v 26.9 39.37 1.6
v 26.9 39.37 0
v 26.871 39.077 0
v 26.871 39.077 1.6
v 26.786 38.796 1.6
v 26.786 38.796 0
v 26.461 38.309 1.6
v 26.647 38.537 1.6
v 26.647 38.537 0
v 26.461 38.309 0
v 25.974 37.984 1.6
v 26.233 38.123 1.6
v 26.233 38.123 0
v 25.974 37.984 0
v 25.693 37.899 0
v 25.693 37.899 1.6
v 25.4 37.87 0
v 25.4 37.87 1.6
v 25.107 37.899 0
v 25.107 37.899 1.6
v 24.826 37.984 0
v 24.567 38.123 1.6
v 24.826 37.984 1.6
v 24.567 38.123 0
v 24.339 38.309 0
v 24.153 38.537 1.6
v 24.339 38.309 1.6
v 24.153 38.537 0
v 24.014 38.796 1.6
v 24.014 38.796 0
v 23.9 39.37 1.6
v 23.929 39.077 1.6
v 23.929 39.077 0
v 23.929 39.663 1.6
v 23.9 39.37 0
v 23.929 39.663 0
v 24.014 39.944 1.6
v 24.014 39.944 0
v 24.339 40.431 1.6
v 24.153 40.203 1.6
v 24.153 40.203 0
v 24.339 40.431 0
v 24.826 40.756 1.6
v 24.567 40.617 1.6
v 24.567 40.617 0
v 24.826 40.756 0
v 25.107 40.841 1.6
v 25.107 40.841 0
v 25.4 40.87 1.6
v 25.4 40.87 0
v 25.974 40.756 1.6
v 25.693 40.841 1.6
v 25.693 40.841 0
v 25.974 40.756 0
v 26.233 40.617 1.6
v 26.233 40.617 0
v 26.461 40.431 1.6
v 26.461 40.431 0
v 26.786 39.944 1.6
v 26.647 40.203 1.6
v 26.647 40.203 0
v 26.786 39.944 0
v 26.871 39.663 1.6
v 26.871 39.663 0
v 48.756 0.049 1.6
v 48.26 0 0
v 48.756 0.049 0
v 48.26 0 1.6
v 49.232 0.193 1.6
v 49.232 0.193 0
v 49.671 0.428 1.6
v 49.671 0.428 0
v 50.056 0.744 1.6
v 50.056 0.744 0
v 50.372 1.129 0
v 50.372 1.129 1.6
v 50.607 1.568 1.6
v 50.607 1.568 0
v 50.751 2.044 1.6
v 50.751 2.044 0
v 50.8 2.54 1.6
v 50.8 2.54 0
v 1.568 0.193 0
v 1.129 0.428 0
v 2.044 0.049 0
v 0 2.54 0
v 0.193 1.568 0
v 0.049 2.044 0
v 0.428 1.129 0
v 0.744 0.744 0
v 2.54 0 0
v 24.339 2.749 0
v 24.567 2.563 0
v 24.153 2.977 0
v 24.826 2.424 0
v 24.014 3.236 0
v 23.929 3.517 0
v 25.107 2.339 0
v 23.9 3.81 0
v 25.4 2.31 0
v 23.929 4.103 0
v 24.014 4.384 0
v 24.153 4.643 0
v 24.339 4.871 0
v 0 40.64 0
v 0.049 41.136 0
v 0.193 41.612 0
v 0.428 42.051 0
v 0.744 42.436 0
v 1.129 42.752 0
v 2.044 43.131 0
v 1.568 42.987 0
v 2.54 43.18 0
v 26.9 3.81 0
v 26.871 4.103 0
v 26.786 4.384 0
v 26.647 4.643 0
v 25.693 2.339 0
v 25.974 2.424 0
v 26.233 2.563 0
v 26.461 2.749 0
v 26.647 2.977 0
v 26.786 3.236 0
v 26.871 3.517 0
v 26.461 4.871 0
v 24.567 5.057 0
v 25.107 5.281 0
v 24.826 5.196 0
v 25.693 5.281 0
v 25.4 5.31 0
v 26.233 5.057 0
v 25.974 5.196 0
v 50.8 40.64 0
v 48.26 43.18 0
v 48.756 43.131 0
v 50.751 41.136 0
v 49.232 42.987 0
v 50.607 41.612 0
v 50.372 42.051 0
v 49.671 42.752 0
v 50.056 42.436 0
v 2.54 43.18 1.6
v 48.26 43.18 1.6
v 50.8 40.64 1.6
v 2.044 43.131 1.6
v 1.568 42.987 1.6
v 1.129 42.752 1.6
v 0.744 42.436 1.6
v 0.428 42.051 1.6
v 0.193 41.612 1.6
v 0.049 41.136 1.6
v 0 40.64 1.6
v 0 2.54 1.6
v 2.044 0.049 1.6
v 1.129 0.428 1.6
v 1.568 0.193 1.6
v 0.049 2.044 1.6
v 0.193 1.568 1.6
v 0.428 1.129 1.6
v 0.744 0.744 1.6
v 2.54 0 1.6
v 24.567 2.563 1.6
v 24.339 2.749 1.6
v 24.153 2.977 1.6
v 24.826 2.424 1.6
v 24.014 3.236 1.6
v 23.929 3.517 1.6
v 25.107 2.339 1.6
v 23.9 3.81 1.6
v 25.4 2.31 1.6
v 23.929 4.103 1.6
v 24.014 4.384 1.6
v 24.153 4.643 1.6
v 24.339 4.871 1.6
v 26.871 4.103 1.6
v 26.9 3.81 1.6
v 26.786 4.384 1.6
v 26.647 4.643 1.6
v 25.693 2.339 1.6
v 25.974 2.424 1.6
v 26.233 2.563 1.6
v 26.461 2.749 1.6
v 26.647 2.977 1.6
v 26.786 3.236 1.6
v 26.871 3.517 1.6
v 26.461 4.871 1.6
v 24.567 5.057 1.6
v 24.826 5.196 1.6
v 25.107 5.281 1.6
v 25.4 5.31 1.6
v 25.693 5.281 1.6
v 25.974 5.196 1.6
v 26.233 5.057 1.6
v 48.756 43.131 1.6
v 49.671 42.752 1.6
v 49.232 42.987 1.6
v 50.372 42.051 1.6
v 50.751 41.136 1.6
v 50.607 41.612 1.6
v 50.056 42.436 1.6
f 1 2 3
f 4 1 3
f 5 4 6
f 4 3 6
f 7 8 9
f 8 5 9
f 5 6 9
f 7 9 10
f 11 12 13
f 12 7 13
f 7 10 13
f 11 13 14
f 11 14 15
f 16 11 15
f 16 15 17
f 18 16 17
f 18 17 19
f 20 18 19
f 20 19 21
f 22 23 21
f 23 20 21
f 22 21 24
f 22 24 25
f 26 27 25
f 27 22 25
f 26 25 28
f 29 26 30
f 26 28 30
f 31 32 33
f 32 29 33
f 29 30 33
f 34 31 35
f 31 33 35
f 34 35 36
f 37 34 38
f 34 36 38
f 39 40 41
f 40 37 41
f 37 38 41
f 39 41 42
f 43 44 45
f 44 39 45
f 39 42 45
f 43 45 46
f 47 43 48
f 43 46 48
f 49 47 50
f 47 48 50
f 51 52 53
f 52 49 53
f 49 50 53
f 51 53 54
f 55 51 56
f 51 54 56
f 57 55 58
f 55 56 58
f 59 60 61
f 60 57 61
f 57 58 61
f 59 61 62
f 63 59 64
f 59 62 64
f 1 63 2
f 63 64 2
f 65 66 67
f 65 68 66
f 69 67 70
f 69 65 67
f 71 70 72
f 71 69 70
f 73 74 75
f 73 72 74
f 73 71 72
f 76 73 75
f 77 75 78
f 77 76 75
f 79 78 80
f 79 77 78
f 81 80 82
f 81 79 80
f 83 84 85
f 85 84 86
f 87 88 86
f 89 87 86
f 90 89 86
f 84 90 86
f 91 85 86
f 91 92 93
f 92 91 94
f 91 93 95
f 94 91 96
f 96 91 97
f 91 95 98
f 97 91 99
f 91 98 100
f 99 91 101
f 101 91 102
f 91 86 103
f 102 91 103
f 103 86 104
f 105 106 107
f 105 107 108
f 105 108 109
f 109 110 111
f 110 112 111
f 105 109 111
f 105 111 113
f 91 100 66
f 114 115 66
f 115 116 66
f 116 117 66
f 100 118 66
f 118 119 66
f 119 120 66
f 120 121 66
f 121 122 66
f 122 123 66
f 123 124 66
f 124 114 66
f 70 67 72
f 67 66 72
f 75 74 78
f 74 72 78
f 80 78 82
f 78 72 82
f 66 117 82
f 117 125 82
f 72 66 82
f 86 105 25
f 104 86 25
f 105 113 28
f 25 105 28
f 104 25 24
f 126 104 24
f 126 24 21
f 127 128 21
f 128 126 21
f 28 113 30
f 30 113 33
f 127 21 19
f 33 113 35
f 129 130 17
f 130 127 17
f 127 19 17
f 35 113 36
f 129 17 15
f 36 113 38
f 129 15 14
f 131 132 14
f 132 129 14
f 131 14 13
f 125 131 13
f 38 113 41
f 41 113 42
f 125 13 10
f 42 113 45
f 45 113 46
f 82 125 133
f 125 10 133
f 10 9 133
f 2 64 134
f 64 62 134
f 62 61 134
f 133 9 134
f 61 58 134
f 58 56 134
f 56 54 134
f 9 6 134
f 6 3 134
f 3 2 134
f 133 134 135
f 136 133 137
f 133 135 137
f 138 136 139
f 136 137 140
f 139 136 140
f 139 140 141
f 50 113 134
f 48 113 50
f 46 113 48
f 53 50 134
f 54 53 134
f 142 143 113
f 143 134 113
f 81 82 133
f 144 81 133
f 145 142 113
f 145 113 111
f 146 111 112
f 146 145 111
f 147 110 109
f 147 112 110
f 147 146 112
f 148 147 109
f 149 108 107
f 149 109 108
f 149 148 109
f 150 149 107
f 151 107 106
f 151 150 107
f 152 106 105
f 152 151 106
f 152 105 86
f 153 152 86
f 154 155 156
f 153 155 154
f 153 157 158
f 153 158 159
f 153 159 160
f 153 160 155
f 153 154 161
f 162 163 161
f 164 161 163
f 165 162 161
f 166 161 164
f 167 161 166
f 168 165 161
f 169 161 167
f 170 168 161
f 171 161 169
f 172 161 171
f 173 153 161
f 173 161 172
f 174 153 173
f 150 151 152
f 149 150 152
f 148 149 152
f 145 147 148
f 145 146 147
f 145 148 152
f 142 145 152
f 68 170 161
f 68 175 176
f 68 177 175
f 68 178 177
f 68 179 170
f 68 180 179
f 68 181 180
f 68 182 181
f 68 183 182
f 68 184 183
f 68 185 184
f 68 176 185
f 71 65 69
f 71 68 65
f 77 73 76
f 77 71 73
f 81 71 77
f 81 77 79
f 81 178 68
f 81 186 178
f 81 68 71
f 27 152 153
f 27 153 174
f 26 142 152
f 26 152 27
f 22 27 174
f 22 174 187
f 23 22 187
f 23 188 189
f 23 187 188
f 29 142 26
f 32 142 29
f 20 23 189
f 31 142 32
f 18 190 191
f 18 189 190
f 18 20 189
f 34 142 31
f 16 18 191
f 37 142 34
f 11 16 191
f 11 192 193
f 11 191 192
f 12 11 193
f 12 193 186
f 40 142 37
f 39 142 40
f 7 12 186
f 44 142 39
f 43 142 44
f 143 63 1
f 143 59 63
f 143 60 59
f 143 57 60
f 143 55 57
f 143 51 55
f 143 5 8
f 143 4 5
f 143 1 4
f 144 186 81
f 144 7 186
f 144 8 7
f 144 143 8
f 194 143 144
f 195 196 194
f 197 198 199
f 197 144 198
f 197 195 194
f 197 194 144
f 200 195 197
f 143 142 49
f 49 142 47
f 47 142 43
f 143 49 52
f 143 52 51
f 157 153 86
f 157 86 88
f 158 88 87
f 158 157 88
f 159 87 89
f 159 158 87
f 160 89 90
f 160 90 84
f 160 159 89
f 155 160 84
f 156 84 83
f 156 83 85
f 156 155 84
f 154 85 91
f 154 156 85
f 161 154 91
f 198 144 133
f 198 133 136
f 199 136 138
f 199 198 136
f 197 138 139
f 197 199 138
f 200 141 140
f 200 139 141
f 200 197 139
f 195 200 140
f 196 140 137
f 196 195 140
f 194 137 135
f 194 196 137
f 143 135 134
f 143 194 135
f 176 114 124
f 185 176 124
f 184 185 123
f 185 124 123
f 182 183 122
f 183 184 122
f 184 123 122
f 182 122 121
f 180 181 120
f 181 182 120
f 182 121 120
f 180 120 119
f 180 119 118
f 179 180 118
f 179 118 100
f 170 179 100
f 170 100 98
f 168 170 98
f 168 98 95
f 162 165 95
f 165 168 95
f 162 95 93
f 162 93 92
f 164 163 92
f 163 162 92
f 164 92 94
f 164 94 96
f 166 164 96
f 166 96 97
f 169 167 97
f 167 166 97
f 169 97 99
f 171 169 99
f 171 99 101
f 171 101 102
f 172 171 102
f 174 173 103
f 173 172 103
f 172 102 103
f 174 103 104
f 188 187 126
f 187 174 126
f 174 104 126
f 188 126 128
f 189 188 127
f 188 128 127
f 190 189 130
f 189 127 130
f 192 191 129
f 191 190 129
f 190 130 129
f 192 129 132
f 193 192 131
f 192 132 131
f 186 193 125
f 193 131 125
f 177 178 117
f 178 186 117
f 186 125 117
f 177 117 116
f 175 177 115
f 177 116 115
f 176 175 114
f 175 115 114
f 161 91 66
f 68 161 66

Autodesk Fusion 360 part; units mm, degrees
sketch "Sketch1" plane through (0, 0, 0) normal (0, 0, 1) x (1, 0, 0)
  line L0 (0, 0) -> (50.8, 0)
  line L1 (50.8, 0) -> (50.8, 43.18)
  line L2 (50.8, 43.18) -> (0, 43.18)
  line L3 (0, 43.18) -> (0, 0)
  line L4 (25.4, 43.18) -> (25.4, 0) construction
  line L5 (0, 21.59) -> (50.8, 21.59) construction
  circle A0 centre (25.4, 39.37) radius 1.5
  circle A1 centre (25.4, 3.81) radius 1.5
  dimension "d1" = 50.8
  dimension "d2" = 43.18
  dimension "d3" = 3
  dimension "d4" = 3
  dimension "d5" = 17.78
  dimension "d6" = 35.56
extrude "Extrude1" add sketch "Sketch1" along normal blind 1.6
fillet "Fillet1" radius 2.54 4 edges at (50.8, 0, 0.8) (50.8, 43.18, 0.8) (0, 0, 0.8) (0, 43.18, 0.8)
